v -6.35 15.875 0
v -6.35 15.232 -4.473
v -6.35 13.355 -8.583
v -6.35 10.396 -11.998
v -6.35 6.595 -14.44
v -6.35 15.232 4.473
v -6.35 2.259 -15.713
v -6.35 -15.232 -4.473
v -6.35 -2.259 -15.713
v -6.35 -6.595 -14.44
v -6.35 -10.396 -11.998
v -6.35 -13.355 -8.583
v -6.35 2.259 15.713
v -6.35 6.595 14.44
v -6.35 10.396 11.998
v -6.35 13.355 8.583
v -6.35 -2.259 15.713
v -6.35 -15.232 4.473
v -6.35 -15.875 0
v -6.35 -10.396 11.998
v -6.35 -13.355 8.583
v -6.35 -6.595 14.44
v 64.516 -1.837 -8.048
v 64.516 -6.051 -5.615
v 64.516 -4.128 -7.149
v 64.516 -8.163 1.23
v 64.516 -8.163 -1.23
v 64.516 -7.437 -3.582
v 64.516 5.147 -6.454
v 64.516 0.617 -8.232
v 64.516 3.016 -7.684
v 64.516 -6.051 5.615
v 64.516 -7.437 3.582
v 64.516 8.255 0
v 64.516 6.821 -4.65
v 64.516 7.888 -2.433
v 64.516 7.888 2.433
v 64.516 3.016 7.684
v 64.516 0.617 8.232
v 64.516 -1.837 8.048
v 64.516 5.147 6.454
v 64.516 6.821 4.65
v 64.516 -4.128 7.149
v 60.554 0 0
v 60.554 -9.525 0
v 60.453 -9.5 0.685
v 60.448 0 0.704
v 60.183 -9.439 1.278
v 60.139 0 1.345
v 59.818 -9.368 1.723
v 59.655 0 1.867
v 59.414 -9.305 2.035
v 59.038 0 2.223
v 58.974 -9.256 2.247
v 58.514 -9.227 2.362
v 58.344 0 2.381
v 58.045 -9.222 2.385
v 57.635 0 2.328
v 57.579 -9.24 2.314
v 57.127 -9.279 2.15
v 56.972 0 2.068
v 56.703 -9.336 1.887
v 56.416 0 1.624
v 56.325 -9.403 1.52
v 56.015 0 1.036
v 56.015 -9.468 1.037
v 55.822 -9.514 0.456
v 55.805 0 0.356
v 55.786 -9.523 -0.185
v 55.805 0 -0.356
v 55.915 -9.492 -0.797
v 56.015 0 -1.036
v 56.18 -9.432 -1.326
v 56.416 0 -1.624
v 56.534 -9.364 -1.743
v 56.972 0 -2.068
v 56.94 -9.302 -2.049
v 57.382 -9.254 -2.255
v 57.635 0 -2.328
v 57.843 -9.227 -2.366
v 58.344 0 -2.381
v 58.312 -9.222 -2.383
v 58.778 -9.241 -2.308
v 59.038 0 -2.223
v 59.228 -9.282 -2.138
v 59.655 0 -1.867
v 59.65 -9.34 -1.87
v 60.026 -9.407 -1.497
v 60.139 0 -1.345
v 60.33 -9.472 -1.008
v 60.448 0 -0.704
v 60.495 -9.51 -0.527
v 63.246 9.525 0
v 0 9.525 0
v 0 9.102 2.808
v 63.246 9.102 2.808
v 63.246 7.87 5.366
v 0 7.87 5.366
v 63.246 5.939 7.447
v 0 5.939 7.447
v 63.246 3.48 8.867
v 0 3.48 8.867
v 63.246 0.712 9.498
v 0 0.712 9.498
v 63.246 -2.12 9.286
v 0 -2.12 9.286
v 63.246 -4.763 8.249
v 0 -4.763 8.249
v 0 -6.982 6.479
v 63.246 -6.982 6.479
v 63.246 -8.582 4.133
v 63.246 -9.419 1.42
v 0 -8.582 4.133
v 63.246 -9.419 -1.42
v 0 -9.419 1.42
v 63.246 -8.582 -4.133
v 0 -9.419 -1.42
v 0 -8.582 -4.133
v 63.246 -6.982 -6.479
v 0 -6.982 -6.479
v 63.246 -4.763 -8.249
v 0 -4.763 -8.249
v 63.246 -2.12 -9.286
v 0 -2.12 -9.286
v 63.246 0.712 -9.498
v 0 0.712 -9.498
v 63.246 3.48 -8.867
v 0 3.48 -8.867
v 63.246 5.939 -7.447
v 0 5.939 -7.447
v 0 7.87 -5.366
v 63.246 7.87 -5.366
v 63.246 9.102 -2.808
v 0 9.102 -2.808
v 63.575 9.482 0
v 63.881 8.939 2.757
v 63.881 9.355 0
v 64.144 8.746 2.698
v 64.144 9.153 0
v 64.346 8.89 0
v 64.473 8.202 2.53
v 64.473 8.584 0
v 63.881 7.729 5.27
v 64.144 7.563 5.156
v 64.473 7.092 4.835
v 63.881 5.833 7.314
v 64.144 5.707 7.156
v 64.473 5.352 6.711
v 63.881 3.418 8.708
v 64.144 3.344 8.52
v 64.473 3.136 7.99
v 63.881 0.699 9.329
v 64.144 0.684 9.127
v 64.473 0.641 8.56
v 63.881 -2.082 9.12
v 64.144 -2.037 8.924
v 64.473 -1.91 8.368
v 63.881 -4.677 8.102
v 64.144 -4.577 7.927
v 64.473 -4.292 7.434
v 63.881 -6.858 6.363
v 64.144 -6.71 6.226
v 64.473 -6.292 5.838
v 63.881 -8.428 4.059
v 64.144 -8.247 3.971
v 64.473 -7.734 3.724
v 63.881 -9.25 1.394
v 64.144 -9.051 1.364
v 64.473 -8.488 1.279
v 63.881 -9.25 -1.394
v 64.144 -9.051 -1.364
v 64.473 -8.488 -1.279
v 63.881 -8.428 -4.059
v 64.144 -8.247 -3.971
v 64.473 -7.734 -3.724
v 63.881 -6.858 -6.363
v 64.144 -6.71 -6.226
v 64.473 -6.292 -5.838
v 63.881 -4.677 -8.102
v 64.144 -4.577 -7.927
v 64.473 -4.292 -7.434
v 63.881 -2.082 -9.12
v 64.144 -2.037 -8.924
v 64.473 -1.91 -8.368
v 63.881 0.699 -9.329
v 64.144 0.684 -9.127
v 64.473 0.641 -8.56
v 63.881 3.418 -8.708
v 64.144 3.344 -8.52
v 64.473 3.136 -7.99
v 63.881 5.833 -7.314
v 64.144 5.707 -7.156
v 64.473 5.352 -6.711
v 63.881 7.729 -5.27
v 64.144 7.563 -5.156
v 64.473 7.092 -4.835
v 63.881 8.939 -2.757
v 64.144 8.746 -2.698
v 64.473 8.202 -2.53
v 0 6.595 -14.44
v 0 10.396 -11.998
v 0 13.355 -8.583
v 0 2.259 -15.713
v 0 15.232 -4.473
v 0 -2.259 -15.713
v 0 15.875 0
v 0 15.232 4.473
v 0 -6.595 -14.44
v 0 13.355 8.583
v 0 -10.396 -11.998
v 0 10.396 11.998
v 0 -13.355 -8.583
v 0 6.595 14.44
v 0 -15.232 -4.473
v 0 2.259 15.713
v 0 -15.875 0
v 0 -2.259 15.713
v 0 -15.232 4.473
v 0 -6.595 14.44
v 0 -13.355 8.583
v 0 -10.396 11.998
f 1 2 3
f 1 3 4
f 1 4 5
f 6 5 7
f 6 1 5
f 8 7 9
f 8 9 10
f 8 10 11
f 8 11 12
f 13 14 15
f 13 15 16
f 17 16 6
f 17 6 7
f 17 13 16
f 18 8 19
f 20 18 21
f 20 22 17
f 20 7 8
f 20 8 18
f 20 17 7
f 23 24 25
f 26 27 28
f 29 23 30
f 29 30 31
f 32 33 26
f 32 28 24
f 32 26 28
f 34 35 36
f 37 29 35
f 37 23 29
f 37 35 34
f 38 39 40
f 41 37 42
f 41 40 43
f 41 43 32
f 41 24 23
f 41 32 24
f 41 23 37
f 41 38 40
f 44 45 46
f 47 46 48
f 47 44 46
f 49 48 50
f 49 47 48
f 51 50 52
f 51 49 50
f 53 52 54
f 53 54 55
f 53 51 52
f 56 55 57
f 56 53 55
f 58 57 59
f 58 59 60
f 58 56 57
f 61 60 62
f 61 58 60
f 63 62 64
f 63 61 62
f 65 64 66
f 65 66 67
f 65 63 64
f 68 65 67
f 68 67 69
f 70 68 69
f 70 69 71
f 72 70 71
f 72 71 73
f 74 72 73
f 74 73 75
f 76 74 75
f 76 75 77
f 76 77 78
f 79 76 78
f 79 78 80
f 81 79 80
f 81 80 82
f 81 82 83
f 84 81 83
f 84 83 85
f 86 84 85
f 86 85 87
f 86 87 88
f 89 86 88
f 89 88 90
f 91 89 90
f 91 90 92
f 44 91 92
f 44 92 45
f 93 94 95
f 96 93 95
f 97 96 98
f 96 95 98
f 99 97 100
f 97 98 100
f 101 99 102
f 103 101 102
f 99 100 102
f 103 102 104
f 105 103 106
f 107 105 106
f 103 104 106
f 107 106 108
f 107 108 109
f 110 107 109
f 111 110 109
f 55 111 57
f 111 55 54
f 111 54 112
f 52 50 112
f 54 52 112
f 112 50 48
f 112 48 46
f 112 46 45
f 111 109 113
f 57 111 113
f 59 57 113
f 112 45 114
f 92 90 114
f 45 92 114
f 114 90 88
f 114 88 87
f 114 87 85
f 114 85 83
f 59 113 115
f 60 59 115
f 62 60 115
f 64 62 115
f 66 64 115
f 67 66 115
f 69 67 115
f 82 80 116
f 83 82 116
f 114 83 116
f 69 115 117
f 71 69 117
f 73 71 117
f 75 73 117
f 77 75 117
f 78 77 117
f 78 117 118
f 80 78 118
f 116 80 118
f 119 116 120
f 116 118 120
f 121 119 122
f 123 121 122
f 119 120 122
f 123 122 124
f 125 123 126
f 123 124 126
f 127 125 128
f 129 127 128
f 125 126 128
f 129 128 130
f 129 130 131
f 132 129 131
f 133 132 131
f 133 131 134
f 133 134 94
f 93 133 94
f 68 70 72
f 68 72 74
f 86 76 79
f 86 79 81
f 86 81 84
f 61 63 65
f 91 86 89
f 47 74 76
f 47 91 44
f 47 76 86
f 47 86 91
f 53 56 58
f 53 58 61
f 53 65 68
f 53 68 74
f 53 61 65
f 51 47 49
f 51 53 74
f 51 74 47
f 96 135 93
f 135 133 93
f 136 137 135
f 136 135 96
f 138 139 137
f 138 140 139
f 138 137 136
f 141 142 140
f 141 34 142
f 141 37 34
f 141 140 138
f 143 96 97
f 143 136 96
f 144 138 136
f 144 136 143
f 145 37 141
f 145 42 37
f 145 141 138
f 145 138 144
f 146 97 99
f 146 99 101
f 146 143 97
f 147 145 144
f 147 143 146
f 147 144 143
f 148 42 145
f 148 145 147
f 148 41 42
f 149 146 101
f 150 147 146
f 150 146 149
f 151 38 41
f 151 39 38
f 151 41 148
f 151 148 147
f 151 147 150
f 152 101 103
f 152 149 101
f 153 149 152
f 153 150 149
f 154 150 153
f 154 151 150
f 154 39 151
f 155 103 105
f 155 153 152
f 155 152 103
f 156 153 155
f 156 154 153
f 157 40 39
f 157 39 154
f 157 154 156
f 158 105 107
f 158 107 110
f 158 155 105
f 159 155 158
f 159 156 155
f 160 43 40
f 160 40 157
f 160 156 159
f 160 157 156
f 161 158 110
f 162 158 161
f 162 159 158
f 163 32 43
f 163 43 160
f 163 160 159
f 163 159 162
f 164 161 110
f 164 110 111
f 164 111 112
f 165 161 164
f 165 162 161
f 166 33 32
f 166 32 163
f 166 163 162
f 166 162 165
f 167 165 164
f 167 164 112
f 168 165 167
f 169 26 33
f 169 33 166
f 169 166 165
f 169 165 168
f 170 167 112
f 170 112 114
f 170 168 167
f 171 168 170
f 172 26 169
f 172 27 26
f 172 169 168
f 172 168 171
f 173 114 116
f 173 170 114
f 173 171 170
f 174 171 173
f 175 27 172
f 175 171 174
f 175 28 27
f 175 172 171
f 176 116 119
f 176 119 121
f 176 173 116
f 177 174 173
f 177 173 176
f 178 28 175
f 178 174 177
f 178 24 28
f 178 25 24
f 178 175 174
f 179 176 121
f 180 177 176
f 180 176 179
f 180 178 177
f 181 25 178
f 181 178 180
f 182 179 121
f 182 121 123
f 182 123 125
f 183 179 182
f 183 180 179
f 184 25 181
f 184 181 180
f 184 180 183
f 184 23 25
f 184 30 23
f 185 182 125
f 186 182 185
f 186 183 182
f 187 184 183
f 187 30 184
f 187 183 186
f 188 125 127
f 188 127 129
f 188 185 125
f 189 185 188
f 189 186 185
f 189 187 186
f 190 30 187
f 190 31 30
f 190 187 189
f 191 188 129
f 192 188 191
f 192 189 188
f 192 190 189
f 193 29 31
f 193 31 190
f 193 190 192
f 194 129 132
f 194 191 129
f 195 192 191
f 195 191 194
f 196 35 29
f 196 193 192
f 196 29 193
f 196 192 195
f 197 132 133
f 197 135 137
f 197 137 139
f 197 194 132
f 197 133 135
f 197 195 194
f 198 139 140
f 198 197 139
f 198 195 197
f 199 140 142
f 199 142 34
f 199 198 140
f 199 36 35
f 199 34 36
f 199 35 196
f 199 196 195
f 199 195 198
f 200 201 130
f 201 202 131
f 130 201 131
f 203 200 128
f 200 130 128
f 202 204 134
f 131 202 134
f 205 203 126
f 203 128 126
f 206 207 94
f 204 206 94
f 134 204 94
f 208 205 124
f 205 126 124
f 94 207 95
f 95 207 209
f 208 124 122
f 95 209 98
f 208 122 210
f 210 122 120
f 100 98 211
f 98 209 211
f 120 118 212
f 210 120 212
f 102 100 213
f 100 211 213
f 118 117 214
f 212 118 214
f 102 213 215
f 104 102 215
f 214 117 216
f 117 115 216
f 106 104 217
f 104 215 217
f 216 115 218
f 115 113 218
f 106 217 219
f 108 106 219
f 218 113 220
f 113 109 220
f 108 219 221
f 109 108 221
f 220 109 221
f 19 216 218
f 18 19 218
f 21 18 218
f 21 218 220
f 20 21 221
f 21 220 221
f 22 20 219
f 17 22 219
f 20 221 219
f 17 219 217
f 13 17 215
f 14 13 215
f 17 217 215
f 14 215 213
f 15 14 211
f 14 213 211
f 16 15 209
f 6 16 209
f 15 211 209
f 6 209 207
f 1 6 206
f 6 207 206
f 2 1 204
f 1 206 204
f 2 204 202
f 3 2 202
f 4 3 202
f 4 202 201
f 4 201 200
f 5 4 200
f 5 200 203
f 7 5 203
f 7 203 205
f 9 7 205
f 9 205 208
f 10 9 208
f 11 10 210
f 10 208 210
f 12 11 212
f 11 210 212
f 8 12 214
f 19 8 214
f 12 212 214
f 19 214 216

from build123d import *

# Parameters (mm, degrees)
F0_R     = 9.525
F1_DEPTH = 64.516
F3_R     = 15.875
F4_DEPTH = 6.35
F2_R     = 2.3876
F5_DEPTH = 15.876
F6_R     = 1.27


with BuildPart() as f1:
    # F0 (on Right) → F1 (new body)
    with BuildSketch(Plane.YZ):
        Circle(F0_R)
    extrude(amount=F1_DEPTH)

    # F3 (on face) → F4 (join)
    with BuildSketch(Plane(origin=(0, 0, 0), x_dir=(0, -1, 0), z_dir=(-1, 0, 0))):
        Circle(F3_R)
    extrude(amount=F4_DEPTH)

    # F2 (on Front) → F5 (cut, through all)
    with BuildSketch(Plane.XZ):
        with Locations((58.166, 0)):
            Circle(F2_R)
    extrude(amount=F5_DEPTH, mode=Mode.SUBTRACT)

    # F6
    f6_edges = [f1.edges().sort_by_distance(p)[0] for p in [
        (64.516, -9.525, 0),
    ]]
    fillet(f6_edges, radius=F6_R)


solid = f1.part
